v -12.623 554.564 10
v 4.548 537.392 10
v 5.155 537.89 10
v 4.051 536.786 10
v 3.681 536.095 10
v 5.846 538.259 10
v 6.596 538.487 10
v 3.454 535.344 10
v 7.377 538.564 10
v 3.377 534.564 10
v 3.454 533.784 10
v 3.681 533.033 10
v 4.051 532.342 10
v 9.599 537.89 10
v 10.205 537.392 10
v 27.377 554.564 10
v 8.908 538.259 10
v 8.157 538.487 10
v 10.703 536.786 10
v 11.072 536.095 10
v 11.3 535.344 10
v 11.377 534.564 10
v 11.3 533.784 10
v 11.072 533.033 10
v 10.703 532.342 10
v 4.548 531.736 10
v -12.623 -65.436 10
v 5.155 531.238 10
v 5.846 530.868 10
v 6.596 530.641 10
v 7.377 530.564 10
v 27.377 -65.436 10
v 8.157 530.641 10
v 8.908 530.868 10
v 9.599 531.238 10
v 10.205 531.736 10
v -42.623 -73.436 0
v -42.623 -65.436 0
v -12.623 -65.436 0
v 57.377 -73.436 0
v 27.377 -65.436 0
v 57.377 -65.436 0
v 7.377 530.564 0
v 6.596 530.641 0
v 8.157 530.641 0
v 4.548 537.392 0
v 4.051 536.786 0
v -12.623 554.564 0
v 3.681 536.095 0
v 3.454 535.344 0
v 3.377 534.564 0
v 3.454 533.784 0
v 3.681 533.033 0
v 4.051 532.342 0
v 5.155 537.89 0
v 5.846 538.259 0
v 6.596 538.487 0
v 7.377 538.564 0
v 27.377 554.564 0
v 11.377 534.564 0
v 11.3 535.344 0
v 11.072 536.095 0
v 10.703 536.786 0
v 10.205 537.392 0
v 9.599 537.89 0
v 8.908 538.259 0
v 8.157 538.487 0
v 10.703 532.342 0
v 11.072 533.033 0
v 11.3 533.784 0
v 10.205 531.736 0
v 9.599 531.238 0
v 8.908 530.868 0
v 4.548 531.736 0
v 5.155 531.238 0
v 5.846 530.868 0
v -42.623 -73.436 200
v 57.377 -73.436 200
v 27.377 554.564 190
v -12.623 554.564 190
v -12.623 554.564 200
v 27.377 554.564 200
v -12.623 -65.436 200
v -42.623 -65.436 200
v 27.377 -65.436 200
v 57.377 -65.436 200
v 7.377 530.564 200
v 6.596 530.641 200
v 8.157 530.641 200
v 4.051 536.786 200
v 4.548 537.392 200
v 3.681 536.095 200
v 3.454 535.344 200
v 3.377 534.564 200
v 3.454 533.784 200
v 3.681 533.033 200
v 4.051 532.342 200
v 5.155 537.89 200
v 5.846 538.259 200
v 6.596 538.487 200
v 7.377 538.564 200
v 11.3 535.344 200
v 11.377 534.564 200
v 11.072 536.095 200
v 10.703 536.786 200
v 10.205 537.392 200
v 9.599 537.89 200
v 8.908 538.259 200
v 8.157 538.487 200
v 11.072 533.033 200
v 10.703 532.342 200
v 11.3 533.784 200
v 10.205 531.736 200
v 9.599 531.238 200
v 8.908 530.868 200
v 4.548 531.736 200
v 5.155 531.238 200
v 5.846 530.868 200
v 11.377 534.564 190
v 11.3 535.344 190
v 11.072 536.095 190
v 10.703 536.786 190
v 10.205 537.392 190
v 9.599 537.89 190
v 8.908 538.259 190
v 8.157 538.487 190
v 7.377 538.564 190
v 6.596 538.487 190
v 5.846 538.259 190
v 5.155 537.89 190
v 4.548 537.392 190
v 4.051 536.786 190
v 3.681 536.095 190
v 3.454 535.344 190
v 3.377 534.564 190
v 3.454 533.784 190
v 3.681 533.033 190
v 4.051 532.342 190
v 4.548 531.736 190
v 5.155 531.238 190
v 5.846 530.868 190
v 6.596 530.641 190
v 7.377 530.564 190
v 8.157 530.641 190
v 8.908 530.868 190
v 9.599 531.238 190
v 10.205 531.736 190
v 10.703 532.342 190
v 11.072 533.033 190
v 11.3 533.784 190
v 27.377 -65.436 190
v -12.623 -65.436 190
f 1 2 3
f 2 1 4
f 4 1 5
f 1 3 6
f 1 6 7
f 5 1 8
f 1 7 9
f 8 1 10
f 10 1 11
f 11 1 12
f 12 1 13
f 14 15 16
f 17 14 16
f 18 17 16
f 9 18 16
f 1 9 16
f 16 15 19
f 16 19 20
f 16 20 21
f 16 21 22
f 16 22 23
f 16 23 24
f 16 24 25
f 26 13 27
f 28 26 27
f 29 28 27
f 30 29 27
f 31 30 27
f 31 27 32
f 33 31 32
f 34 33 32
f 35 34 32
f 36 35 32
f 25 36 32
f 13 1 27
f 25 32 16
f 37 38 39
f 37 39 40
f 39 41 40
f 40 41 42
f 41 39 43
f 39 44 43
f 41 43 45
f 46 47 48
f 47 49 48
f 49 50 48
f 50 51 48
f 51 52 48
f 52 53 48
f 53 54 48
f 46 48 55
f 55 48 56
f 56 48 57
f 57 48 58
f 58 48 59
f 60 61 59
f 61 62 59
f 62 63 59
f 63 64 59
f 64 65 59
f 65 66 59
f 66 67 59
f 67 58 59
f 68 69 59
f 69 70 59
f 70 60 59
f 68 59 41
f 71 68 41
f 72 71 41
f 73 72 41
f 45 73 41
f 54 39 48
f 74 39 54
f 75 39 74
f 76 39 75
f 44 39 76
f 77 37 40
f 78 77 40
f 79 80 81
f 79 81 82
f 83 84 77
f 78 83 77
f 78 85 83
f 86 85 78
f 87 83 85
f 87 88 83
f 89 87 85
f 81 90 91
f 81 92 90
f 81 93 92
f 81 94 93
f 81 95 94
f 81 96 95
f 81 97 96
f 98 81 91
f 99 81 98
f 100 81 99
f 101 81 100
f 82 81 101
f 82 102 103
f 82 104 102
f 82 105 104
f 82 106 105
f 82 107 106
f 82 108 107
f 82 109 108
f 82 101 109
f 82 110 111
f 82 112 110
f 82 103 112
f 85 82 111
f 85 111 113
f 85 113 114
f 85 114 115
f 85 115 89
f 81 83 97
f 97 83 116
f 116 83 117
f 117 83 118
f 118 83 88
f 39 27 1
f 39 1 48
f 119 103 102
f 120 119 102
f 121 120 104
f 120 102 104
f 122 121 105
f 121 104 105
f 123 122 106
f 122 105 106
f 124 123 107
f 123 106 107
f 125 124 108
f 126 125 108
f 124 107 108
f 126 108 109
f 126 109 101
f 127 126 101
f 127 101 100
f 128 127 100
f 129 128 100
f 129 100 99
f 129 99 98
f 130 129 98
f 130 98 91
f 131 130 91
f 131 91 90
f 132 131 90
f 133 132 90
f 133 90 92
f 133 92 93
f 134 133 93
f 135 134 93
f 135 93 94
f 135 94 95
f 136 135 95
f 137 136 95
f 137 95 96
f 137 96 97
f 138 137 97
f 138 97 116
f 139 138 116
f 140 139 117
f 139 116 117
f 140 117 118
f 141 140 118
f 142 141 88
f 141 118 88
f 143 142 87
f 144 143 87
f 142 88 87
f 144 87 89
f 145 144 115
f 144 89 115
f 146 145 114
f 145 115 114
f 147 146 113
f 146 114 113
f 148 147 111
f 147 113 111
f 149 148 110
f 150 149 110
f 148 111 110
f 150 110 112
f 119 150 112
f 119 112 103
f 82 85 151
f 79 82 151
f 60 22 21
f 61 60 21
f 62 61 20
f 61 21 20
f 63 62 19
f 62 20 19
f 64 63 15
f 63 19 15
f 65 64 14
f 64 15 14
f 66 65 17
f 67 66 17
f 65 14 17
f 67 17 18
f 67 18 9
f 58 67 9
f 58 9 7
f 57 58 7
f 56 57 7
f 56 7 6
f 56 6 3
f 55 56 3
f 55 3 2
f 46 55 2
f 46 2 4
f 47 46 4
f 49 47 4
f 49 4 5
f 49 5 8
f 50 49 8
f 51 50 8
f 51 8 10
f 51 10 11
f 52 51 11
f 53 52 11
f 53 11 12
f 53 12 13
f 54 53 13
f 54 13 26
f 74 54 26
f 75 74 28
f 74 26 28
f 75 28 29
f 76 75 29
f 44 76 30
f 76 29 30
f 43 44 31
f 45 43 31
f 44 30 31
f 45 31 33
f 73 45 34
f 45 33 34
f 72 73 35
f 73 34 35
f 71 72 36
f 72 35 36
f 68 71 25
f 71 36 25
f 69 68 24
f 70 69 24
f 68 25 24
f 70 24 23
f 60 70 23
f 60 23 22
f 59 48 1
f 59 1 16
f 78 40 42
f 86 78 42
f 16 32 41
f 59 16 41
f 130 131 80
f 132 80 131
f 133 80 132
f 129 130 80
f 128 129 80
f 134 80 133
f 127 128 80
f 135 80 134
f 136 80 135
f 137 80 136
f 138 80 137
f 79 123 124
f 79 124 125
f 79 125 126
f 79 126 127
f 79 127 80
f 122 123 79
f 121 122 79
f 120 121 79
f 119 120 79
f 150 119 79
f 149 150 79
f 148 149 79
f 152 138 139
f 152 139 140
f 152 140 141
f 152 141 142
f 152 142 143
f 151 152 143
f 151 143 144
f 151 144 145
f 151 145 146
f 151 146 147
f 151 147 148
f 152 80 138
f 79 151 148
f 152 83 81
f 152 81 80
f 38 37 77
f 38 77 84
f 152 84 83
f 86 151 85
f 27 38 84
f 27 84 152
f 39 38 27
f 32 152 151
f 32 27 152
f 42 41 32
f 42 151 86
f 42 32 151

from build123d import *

# Parameters (mm, degrees)
SKETCH1_W          = 100
SKETCH1_H          = 8
EXTRUDE1_DEPTH     = 200
SKETCH4_W          = 40
SKETCH4_H          = 10
EXTRUDE3_DEPTH     = 620
SKETCH5_R          = 4
CUT_EXTRUDE2_DEPTH = 620


with BuildPart() as part:
    # Sketch1 → Extrude1 (new body)
    with BuildSketch(Plane.XY):
        with Locations((7.376785714, -69.436049107)):
            Rectangle(SKETCH1_W, SKETCH1_H)
    extrude(amount=EXTRUDE1_DEPTH)

    # Sketch4 → Extrude3 (add)
    with BuildSketch(Plane(origin=(0, -65.436049107, 0), x_dir=(1, 0, 0), z_dir=(0, 1, 0))):
        with Locations((7.376785714, -195)):
            Rectangle(SKETCH4_W, SKETCH4_H)
        with Locations((7.376785714, -5)):
            Rectangle(SKETCH4_W, SKETCH4_H)
    extrude(amount=EXTRUDE3_DEPTH)

    # Sketch5 → Cut-Extrude2 (cut)
    with BuildSketch(Plane.XY.offset(200)):
        with Locations((7.376785714, 534.563950893)):
            Circle(SKETCH5_R)
    extrude(amount=-CUT_EXTRUDE2_DEPTH, mode=Mode.SUBTRACT)


solid = part.part
